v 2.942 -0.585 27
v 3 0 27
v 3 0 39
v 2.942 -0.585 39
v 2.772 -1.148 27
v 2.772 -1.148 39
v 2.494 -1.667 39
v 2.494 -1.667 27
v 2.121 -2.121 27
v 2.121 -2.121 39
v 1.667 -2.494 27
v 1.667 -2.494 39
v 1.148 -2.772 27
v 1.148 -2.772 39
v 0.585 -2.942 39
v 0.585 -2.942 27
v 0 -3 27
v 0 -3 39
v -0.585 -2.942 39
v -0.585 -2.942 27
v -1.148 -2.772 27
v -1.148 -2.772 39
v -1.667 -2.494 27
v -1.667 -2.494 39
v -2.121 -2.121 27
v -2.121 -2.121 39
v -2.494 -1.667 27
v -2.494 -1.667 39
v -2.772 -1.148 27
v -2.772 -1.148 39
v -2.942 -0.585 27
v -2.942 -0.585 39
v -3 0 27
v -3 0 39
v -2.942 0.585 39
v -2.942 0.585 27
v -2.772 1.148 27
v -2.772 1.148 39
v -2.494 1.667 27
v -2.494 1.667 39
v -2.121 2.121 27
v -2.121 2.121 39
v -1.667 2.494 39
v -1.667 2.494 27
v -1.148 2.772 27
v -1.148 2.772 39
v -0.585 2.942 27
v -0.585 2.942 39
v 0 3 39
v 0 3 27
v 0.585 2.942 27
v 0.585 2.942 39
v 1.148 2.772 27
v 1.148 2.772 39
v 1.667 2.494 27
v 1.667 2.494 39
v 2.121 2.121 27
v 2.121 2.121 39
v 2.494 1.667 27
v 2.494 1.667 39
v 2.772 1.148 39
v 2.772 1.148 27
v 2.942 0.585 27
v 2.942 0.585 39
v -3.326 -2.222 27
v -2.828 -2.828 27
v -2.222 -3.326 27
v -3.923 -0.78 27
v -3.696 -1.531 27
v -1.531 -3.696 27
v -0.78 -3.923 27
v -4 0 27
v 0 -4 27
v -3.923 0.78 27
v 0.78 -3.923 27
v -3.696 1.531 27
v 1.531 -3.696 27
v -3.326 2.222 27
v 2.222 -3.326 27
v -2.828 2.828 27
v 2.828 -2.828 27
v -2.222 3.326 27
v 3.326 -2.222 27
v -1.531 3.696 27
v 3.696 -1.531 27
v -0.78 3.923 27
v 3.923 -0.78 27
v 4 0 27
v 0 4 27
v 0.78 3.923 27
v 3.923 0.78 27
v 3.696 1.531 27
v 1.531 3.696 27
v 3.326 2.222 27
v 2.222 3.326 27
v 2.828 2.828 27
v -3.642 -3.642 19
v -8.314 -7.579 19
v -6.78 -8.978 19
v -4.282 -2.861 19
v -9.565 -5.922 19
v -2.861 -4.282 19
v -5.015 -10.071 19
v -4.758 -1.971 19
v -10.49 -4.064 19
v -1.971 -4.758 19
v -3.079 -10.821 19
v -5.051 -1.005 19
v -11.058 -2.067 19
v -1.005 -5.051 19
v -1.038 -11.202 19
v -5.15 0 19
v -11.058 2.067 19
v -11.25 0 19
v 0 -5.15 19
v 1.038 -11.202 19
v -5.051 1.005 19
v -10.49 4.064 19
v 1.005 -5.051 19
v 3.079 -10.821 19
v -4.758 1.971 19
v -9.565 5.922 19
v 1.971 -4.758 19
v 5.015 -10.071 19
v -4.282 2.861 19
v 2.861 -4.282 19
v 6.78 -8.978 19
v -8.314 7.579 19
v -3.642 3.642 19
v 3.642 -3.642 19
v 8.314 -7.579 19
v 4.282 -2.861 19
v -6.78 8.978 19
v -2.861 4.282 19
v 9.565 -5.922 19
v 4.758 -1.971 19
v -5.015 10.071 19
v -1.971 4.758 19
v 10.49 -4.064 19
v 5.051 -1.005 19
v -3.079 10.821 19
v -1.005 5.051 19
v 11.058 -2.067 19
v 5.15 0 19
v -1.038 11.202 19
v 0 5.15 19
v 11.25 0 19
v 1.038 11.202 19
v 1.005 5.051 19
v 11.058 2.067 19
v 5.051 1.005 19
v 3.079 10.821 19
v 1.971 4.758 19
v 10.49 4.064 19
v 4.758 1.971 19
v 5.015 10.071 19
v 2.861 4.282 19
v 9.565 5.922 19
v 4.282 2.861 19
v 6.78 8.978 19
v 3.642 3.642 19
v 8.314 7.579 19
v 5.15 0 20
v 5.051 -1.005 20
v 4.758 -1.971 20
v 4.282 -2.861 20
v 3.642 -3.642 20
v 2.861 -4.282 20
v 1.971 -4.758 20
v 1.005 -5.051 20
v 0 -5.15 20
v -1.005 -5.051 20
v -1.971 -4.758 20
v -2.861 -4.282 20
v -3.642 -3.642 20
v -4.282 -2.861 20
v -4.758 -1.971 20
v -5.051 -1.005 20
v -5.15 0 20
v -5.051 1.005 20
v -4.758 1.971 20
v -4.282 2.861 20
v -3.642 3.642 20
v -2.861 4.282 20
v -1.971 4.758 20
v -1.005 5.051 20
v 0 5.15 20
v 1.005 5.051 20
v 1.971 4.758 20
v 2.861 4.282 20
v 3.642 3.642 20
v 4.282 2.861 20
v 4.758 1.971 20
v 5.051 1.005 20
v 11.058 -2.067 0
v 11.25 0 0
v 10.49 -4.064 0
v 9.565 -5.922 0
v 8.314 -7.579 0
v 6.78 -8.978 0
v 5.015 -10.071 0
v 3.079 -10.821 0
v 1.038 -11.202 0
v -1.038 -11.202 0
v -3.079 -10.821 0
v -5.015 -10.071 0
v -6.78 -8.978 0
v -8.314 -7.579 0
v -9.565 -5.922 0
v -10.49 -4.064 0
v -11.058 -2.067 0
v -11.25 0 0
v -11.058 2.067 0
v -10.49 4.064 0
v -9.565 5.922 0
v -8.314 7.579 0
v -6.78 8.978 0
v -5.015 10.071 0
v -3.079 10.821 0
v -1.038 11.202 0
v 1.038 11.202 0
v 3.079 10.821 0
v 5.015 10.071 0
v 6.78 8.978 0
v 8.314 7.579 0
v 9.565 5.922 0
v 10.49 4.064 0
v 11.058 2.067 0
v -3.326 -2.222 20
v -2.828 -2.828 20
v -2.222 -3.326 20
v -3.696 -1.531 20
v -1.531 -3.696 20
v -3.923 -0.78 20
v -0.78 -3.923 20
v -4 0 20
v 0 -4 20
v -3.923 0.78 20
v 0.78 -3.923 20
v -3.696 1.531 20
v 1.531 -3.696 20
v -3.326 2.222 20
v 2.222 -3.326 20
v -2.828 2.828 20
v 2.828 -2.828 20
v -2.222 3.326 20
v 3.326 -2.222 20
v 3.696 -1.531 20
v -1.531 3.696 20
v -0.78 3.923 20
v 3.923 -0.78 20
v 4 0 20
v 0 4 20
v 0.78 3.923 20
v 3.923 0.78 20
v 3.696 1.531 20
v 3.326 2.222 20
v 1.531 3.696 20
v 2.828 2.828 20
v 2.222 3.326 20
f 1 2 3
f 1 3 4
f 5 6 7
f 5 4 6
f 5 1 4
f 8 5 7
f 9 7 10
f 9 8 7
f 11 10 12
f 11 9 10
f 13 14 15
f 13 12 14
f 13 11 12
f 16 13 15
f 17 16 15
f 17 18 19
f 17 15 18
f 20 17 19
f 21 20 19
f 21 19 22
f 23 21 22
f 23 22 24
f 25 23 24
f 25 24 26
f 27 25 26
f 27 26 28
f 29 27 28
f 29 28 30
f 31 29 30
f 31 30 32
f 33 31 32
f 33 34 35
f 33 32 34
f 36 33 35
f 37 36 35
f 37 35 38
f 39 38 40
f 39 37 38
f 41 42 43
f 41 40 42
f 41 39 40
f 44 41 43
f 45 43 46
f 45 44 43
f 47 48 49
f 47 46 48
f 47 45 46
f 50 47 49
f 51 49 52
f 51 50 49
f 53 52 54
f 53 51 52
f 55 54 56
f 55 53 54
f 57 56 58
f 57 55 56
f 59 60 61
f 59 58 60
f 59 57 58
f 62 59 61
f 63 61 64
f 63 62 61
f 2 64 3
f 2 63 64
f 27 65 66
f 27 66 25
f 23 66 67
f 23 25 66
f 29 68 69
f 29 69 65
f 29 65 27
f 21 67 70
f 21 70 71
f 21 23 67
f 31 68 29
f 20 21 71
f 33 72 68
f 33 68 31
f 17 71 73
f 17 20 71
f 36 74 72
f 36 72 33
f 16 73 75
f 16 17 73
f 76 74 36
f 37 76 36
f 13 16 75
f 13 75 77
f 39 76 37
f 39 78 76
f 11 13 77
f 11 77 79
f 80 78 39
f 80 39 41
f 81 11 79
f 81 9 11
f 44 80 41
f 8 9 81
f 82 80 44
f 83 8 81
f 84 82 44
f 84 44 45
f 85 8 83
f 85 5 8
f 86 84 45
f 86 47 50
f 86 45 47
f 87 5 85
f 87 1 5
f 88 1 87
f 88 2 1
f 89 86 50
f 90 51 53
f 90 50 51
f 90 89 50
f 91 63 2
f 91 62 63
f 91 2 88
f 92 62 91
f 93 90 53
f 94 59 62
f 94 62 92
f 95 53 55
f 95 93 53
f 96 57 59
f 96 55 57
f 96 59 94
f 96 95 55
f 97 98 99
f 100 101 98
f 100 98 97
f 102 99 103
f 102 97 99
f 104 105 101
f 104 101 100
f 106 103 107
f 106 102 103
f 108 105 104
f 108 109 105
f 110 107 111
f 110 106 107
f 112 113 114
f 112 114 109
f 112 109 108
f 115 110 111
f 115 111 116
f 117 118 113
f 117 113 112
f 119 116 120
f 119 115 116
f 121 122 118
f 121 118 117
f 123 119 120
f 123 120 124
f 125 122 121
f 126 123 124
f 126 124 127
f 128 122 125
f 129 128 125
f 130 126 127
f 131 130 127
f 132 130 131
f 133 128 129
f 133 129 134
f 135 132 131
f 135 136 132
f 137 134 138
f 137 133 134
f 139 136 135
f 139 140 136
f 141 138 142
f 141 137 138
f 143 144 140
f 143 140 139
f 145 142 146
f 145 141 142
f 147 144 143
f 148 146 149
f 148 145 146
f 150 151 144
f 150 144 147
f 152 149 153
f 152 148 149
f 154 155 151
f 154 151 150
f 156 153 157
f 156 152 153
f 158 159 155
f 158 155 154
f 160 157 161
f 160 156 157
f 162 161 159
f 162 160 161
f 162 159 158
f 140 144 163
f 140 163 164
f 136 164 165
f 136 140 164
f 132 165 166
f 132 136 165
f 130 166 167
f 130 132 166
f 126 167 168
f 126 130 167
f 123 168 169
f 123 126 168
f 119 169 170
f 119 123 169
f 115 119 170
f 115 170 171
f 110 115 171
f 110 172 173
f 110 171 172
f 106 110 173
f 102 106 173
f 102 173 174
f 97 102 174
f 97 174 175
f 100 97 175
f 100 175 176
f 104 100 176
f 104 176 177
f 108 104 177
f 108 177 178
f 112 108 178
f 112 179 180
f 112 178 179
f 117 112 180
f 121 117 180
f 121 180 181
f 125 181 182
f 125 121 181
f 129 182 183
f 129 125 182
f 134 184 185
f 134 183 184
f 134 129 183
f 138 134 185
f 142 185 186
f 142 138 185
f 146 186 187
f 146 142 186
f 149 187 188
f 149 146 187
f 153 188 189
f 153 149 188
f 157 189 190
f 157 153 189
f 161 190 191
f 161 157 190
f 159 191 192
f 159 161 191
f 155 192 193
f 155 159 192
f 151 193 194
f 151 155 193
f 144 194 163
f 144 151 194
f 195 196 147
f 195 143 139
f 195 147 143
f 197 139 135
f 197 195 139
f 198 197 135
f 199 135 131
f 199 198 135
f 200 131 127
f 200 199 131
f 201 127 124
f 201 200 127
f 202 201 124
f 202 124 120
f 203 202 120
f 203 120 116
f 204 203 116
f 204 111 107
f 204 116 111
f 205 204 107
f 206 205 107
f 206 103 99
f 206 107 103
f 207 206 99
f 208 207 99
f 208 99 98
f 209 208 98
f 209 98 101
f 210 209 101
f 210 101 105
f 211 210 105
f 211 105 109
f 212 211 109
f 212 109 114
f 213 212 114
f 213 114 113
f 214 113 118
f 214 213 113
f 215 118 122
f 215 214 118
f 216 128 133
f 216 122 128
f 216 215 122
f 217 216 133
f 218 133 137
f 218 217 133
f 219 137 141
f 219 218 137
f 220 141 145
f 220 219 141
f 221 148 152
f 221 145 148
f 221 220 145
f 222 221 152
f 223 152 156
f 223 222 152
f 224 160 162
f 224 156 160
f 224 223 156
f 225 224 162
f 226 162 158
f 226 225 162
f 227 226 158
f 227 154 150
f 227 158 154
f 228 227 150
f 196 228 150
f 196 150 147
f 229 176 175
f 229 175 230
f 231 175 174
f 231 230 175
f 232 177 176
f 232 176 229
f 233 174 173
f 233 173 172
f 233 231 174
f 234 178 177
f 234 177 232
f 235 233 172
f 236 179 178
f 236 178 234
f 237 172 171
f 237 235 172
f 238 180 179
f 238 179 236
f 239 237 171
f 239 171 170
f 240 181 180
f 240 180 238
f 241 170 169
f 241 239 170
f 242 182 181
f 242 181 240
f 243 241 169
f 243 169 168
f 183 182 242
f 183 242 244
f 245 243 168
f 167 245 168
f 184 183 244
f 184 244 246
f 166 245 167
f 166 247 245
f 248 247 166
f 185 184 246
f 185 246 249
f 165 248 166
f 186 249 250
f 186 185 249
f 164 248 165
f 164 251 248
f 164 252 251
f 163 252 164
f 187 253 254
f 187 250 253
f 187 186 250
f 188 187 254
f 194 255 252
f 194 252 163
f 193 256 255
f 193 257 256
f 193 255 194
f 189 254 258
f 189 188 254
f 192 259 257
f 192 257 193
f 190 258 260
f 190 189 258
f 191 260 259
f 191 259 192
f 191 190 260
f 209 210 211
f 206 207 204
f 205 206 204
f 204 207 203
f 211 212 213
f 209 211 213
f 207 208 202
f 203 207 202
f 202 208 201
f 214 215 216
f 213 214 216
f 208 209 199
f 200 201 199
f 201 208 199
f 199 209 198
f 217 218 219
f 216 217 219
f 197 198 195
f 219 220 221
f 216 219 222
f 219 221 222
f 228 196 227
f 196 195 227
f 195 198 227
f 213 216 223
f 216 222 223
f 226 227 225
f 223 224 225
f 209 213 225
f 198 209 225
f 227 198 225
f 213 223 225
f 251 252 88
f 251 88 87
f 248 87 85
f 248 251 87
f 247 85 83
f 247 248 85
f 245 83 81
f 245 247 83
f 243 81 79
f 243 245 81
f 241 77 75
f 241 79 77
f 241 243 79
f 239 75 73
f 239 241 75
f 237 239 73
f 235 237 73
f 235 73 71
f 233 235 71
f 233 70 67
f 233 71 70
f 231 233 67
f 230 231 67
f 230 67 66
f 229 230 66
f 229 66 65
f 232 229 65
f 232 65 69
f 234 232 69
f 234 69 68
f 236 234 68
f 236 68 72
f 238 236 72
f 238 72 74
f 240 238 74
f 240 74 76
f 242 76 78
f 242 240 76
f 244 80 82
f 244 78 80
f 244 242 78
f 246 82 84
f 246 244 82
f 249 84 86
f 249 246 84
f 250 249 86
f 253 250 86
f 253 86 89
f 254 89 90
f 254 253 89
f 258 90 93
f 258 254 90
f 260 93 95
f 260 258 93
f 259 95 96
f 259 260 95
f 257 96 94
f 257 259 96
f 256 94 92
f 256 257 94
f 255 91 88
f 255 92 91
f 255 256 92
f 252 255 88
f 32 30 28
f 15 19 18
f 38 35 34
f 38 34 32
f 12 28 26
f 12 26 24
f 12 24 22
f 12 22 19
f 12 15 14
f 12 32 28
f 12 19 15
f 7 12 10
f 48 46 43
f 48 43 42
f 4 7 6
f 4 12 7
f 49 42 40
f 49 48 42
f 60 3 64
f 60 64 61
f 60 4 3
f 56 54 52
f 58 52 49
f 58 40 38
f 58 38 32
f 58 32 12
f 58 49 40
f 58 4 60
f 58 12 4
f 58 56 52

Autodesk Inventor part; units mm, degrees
ref_plane "YZ Plane" through (0, 0, 0) normal (1, 0, 0) x (0, 1, 0)
ref_plane "XZ Plane" through (0, 0, 0) normal (0, 1, 0) x (-1, 0, 0)
ref_plane "XY Plane" through (0, 0, 0) normal (0, 0, 1) x (1, 0, 0)
sketch "スケッチ1" plane through (0, 0, 0) normal (0, 0, 1) x (1, 0, 0)
  circle A0 centre (0, 0) radius 11.25
  dimension "d0" = 22.5
extrude "押し出し1" add sketch "スケッチ1" along normal blind 19
sketch "スケッチ2" plane through (0, 0, 19) normal (0, 0, 1) x (1, 0, 0)
  circle A0 centre (0, 0) radius 11.25 projected
  circle A1 centre (0, 0) radius 5.15
  dimension "d3" = 10.3
extrude "押し出し2" add sketch "スケッチ2" along normal blind 1 contours A1
sketch "スケッチ3" plane through (0, 0, 20) normal (0, 0, 1) x (1, 0, 0)
  circle A0 centre (0, 0) radius 5.15 projected
  circle A1 centre (0, 0) radius 4
  dimension "d6" = 8
extrude "押し出し3" add sketch "スケッチ3" along normal blind 7 contours A1
sketch "スケッチ4" plane through (0, 0, 27) normal (0, 0, 1) x (1, 0, 0)
  circle A0 centre (0, 0) radius 4 projected
  circle A1 centre (0, 0) radius 3
  dimension "d9" = 6
extrude "押し出し4" add sketch "スケッチ4" along normal blind 12 contours A1
thread "ねじ1" size "M9x1.25" class "6g" standard "ANSI Metric M Profile" full length
properties part number "ポテンションメーター_ＢＩ-７２８４_rev2"
